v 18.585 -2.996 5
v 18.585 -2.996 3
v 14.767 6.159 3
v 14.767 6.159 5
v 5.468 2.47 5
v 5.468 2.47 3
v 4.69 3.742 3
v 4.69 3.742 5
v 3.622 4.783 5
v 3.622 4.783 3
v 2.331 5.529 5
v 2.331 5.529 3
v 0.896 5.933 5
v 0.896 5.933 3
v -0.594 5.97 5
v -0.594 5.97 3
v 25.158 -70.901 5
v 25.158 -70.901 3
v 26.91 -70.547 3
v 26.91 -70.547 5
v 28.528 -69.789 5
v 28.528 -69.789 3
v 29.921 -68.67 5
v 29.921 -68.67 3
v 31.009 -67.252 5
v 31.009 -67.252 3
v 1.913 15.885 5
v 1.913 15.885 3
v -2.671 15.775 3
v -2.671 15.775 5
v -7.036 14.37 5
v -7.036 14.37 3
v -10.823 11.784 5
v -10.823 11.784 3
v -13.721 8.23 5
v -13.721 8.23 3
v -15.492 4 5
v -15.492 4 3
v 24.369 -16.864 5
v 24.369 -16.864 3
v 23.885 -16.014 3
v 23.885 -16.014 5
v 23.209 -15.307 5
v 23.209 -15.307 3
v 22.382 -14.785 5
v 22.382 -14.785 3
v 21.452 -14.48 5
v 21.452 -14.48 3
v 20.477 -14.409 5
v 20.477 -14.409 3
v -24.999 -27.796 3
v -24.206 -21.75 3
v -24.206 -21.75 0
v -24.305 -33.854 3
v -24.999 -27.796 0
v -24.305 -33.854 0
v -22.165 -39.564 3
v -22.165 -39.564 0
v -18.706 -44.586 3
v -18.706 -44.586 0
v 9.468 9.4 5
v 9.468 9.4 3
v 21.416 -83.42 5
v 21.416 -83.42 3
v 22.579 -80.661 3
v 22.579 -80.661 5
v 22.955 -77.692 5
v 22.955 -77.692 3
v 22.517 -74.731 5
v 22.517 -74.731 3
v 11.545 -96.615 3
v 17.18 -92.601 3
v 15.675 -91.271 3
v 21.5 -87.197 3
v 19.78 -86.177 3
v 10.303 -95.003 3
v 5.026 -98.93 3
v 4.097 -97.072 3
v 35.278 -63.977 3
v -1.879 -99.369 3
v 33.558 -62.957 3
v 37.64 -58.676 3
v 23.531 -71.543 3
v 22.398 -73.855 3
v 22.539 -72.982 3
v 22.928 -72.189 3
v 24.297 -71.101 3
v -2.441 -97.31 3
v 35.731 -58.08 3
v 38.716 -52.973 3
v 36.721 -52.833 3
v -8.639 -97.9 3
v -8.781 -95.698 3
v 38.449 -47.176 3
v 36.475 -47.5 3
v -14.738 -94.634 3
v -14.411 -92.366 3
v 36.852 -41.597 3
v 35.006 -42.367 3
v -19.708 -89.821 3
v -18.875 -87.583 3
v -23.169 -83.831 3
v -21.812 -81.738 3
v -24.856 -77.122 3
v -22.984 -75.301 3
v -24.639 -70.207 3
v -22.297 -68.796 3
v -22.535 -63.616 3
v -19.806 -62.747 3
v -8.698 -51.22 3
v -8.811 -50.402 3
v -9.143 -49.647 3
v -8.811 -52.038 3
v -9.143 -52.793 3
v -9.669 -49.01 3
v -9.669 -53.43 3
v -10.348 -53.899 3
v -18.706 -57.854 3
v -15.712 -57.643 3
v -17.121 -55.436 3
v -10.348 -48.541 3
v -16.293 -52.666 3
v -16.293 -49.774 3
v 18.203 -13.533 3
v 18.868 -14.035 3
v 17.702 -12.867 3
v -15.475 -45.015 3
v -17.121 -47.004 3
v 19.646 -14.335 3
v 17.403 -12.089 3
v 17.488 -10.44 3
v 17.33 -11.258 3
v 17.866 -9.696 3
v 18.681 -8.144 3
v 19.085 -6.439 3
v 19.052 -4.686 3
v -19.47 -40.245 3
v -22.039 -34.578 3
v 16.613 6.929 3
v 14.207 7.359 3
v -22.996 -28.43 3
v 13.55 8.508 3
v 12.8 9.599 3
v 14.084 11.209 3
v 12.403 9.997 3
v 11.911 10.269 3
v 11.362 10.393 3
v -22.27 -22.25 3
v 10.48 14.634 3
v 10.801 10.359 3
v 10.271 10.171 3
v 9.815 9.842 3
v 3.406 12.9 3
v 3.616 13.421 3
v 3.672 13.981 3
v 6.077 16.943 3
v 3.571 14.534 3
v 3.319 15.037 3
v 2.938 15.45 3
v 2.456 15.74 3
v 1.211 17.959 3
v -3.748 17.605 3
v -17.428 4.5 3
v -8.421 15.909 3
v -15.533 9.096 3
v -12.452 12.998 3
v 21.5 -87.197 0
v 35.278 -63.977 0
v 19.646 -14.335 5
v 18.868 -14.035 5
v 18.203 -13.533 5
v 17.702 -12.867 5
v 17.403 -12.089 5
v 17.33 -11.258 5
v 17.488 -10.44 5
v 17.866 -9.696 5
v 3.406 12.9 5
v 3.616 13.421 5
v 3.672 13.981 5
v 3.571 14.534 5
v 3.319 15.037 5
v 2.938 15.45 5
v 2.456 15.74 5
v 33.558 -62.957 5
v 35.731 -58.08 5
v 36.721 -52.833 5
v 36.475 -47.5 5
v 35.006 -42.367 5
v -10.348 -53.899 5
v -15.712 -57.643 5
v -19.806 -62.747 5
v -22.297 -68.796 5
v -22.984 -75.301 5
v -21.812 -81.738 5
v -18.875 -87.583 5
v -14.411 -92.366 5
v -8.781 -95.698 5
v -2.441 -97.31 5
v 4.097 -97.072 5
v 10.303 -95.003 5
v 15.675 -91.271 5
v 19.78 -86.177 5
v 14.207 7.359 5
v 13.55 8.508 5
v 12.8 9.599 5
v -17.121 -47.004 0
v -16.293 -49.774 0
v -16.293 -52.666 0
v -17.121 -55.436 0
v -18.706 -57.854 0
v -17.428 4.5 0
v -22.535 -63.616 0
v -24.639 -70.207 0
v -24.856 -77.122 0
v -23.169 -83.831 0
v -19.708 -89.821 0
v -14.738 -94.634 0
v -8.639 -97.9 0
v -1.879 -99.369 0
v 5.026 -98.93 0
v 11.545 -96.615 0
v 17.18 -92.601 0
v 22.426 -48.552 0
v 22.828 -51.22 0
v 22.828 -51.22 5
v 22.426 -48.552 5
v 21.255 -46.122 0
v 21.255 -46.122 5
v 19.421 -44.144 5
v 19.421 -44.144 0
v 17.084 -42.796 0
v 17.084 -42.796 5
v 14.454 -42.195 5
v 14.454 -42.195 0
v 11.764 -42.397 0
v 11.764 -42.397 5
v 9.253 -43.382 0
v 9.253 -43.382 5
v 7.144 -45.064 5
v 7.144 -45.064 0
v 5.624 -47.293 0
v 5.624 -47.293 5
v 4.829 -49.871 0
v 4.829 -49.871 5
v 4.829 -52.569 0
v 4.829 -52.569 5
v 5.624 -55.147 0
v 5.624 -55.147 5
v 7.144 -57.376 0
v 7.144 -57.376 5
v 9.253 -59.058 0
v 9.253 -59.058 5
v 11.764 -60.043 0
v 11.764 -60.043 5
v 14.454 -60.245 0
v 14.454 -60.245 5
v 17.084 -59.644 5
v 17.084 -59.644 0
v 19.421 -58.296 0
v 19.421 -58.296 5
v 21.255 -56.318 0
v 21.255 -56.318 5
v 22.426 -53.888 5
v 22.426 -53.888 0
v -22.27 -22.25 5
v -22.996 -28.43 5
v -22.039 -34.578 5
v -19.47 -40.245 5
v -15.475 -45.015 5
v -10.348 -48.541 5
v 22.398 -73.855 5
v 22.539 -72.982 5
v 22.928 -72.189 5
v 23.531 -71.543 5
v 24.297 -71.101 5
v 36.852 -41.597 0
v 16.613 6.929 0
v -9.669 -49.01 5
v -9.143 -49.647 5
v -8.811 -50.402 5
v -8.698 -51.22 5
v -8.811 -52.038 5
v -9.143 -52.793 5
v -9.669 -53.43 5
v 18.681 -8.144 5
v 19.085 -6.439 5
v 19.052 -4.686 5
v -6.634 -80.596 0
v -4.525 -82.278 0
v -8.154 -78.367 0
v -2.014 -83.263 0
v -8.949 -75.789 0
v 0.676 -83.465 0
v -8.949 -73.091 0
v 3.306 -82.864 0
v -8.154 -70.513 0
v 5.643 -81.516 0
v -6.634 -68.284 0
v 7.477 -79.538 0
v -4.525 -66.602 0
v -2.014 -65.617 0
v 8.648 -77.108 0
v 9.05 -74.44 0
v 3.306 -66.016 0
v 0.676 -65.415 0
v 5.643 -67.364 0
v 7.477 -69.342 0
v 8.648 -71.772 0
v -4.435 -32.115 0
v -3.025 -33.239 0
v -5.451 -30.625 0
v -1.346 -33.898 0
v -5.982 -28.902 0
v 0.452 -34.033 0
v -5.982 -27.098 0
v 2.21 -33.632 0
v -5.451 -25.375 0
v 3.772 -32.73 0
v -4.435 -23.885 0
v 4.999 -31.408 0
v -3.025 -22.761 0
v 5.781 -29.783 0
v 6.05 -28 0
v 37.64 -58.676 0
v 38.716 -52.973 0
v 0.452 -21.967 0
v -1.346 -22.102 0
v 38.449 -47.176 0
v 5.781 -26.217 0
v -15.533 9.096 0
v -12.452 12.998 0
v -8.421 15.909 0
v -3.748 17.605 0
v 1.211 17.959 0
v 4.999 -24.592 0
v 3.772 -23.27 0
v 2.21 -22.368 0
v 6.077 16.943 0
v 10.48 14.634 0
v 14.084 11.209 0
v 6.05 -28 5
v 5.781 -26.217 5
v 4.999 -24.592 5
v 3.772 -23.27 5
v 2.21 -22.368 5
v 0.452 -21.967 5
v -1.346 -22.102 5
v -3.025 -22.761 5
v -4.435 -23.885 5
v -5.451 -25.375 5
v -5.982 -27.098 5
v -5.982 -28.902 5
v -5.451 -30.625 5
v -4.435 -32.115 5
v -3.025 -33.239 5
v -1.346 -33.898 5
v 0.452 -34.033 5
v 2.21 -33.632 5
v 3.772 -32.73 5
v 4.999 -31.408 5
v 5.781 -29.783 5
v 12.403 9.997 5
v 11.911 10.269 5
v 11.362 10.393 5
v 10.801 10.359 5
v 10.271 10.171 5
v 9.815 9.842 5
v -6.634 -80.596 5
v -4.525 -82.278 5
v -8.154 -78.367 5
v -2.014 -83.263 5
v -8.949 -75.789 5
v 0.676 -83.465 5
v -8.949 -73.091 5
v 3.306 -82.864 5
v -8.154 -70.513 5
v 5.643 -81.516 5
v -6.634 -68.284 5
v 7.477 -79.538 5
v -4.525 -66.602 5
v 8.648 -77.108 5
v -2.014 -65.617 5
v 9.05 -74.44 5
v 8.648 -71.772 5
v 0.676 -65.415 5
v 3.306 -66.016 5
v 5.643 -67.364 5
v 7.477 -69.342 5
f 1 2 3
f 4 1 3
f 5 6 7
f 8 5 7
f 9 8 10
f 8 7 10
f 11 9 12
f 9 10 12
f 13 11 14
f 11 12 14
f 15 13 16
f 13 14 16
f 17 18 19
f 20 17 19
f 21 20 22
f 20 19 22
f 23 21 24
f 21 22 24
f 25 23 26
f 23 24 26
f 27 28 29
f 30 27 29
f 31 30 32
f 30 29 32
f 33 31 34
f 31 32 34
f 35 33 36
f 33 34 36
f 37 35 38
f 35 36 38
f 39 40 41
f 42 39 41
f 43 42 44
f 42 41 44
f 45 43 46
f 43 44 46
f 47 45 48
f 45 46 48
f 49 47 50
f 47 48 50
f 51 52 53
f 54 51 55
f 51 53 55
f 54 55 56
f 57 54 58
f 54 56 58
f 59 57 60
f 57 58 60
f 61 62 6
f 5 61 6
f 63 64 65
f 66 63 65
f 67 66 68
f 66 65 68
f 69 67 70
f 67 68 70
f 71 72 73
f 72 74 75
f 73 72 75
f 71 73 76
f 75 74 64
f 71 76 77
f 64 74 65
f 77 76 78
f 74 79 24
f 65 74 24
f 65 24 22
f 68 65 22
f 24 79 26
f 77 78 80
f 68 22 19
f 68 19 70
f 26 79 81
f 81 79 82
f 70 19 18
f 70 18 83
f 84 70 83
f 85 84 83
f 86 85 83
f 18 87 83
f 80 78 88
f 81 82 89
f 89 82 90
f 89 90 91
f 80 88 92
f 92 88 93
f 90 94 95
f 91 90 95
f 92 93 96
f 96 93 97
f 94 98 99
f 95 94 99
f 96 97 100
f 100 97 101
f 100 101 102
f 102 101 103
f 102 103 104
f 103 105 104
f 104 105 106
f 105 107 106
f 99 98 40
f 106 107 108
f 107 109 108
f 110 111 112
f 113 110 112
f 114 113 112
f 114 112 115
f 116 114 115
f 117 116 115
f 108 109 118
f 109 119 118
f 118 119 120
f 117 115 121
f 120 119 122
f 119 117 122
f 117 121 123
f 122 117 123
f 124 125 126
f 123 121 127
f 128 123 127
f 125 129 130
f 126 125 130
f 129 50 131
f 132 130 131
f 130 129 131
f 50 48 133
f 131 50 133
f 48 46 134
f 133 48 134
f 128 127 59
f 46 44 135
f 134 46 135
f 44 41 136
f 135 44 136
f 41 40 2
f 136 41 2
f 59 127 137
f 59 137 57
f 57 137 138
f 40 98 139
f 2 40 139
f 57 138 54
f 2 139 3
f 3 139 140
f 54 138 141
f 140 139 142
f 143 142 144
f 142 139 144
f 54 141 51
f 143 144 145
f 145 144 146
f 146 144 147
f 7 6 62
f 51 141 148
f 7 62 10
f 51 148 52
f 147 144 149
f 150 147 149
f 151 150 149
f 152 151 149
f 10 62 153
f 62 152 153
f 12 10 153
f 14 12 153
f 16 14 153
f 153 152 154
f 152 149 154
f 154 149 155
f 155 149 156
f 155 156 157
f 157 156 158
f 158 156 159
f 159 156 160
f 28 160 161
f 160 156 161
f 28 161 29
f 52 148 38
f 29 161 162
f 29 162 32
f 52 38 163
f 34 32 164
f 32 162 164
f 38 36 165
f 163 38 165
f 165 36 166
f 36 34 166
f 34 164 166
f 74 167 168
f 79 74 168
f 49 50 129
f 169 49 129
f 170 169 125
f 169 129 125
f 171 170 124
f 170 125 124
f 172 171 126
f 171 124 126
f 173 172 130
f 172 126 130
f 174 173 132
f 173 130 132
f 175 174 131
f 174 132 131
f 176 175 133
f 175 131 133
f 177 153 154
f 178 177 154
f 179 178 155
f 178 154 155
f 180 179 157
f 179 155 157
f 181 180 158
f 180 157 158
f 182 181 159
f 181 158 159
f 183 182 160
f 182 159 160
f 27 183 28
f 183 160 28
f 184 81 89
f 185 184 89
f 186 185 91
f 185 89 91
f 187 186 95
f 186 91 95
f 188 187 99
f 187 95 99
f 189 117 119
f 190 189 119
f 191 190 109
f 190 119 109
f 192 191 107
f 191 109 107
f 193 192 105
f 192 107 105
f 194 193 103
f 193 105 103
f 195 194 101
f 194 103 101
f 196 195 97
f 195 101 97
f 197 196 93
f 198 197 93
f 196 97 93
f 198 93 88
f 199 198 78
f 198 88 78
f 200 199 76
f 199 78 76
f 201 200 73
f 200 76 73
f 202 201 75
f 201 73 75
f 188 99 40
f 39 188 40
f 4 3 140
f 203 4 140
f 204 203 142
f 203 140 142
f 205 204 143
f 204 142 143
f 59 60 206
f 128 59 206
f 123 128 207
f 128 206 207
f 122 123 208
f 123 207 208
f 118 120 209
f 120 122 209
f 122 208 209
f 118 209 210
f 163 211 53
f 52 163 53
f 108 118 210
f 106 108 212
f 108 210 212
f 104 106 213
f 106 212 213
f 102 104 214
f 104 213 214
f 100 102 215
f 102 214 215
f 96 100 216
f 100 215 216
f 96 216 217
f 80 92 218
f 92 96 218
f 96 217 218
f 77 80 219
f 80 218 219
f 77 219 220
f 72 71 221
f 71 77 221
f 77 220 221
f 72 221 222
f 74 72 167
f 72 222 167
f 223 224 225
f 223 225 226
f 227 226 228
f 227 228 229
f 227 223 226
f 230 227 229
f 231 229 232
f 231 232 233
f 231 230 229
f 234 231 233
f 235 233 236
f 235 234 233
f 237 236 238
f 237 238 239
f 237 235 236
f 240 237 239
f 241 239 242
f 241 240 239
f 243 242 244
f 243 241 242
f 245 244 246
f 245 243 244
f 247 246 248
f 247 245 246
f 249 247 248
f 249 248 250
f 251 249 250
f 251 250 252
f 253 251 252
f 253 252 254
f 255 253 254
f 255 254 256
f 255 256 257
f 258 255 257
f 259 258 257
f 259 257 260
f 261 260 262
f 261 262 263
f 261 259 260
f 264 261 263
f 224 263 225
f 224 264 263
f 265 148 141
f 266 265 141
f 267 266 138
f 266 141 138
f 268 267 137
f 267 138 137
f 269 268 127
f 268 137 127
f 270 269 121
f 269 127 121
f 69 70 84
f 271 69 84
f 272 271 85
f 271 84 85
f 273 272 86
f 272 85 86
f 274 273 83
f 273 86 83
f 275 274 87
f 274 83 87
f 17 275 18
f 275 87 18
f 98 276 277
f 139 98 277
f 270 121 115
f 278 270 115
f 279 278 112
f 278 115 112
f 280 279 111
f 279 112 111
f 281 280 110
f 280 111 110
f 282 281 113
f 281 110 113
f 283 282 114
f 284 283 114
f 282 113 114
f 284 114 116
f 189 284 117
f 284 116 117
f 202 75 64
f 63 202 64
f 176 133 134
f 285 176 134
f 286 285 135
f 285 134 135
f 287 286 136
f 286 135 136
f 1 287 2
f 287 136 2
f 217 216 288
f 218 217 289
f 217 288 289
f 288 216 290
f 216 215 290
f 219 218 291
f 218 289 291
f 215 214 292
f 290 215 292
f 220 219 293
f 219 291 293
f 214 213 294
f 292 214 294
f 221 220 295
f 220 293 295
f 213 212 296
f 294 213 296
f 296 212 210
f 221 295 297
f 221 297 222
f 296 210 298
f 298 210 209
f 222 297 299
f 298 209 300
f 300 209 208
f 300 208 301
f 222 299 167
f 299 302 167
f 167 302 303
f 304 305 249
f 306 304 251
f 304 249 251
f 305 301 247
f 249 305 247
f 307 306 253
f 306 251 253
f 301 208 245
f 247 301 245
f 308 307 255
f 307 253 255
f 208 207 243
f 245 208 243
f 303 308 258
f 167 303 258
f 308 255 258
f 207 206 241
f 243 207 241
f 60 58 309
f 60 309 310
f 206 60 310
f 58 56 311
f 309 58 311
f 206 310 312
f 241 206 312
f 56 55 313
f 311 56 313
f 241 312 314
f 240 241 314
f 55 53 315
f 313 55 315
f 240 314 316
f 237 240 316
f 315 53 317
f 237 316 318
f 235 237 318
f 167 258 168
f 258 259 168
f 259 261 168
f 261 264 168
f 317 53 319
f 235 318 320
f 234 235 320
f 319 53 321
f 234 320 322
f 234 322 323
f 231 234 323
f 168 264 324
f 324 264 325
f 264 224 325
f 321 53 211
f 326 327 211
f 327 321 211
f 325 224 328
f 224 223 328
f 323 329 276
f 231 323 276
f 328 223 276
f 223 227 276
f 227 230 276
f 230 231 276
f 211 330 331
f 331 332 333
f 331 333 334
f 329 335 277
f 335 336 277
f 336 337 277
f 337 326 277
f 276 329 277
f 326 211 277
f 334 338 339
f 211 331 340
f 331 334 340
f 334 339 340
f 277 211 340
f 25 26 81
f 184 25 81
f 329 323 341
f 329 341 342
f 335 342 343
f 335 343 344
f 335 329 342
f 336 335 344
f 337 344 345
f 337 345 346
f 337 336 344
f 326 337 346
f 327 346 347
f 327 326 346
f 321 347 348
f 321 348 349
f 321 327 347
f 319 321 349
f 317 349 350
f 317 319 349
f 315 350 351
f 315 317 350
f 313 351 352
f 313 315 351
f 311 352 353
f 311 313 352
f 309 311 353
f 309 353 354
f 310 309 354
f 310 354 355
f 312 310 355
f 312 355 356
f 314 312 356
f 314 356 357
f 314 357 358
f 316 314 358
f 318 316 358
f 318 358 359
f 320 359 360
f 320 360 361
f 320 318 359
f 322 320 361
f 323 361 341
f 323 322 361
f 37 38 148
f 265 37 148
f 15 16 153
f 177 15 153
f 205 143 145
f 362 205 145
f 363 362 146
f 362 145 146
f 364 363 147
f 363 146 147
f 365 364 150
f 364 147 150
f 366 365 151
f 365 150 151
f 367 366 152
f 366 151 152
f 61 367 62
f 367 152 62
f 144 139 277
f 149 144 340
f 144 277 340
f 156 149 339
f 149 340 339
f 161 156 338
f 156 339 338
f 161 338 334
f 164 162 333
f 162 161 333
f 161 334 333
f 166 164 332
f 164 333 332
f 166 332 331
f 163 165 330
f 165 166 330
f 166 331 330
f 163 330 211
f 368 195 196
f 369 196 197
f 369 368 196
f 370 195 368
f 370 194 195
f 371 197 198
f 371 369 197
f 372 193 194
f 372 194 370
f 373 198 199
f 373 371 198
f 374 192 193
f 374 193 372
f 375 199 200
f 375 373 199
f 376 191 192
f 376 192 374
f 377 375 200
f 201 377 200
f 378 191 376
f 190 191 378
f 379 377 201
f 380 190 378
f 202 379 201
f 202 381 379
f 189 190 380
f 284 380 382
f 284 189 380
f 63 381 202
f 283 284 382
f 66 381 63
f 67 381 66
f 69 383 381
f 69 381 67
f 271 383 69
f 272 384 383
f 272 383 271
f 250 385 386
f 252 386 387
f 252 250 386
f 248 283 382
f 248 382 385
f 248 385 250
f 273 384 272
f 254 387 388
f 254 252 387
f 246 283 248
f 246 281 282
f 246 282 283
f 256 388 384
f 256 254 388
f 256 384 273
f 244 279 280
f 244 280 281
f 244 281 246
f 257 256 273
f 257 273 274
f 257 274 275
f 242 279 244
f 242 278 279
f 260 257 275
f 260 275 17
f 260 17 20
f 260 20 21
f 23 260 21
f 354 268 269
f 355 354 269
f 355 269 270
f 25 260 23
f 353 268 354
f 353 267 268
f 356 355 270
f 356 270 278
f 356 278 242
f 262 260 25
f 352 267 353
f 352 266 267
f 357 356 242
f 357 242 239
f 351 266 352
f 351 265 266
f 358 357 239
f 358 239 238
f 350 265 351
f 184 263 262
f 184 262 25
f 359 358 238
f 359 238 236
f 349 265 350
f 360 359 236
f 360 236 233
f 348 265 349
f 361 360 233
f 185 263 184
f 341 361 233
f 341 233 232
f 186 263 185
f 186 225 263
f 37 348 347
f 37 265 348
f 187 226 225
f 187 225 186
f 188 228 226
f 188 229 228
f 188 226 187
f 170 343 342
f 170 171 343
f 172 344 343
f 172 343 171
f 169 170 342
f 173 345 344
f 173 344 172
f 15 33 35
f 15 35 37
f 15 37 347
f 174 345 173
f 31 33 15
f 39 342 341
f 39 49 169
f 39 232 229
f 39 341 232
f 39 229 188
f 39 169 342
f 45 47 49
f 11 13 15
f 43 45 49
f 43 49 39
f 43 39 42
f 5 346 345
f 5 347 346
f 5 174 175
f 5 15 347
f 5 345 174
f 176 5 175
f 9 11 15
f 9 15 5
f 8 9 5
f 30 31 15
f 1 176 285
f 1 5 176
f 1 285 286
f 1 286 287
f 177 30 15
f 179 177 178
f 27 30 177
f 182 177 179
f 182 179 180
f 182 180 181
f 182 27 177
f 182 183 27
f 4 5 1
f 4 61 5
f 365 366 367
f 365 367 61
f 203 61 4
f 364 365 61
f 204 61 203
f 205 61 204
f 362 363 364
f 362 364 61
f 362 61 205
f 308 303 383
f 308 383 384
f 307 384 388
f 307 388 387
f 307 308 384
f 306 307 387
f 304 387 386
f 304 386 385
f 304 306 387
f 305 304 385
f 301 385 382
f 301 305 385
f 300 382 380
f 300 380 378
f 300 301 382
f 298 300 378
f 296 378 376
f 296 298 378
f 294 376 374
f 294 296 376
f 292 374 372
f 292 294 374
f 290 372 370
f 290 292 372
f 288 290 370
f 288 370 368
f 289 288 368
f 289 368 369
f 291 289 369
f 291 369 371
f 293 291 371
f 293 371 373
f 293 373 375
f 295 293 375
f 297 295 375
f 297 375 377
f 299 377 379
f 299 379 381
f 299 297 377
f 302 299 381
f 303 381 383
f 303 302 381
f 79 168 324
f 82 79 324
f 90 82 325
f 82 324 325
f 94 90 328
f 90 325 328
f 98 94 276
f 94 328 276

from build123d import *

# Parameters (mm, degrees)
SKETCH1_R           = 6.05
SKETCH1_R_2         = 9.05
BOSS_EXTRUDE1_DEPTH = 5
CUT_EXTRUDE1_START  = -2
CUT_EXTRUDE1_DEPTH  = 2


with BuildPart() as part:
    # Sketch1 → Boss-Extrude1 (new body)
    with BuildSketch(Plane.XY):
        with BuildLine():
            Line((-17.428425058, 4.5), (-24.206145914, -21.75))
            ThreePointArc((-24.206145914, -21.75), (-24.304944461, -33.854030643), (-18.705990528, -44.585714286))
            ThreePointArc((-18.705990528, -44.585714286), (-16.188386739, -51.22), (-18.705990528, -57.854285714))
            ThreePointArc((-18.705990528, -57.854285714), (-14.737892988, -94.633922608), (21.5, -87.197350822))
            Line((21.5, -87.197350822), (35.277938888, -63.977350822))
            ThreePointArc((35.277938888, -63.977350822), (38.71637128, -52.973450833), (36.851550967, -41.59667284))
            Line((36.851550967, -41.59667284), (16.613000697, 6.928795555))
            ThreePointArc((16.613000697, 6.928795555), (-1.281011782, 17.954359048), (-17.428425058, 4.5))
        make_face()
        with Locations((0, -28)):
            Circle(SKETCH1_R, mode=Mode.SUBTRACT)
        with Locations((13.777938888, -51.22)):
            Circle(SKETCH1_R_2, mode=Mode.SUBTRACT)
        with Locations((0, -74.44)):
            Circle(SKETCH1_R_2, mode=Mode.SUBTRACT)
    extrude(amount=BOSS_EXTRUDE1_DEPTH)

    # Sketch2 → Cut-Extrude1 (cut)
    with BuildSketch(Plane.XY.offset(5).offset(CUT_EXTRUDE1_START)):
        with BuildLine():
            Line((16.613000697, 6.928795555), (36.851550967, -41.59667284))
            ThreePointArc((36.851550967, -41.59667284), (38.71637128, -52.973450833), (35.277938888, -63.977350822))
            Line((35.277938888, -63.977350822), (21.5, -87.197350822))
            ThreePointArc((21.5, -87.197350822), (-14.737892988, -94.633922608), (-18.705990528, -57.854285714))
            ThreePointArc((-18.705990528, -57.854285714), (-16.188386739, -51.22), (-18.705990528, -44.585714286))
            ThreePointArc((-18.705990528, -44.585714286), (-24.304944461, -33.854030643), (-24.206145914, -21.75))
            Line((-24.206145914, -21.75), (-17.428425058, 4.5))
            ThreePointArc((-17.428425058, 4.5), (-1.281011782, 17.954359048), (16.613000697, 6.928795555))
        make_face()
        with BuildLine():
            Line((9.468285508, 9.39955156), (5.467787499, 2.470485754))
            ThreePointArc((5.467787499, 2.470485754), (3, 5.196152423), (-0.594390327, 5.970485754))
            Line((-0.594390327, 5.970485754), (3.406107682, 12.89955156))
            ThreePointArc((3.406107682, 12.89955156), (3.46289335, 14.794014563), (1.913207856, 15.885201783))
            ThreePointArc((1.913207856, 15.885201783), (-9.022746373, 13.213252737), (-15.491933385, 4))
            Line((-15.491933385, 4), (-22.269654241, -22.25))
            ThreePointArc((-22.269654241, -22.25), (-20.946970822, -37.498653241), (-10.347792006, -48.540769231))
            ThreePointArc((-10.347792006, -48.540769231), (-8.697504007, -51.22), (-10.347792006, -53.899230769))
            ThreePointArc((-10.347792006, -53.899230769), (-16.813726675, -90.133903125), (19.78, -86.176762756))
            Line((19.78, -86.176762756), (21.416047429, -83.419527323))
            ThreePointArc((21.416047429, -83.419527323), (22.868749584, -79.189380689), (22.517294907, -74.730573258))
            ThreePointArc((22.517294907, -74.730573258), (22.927957655, -72.188598464), (25.15802624, -70.901324657))
            ThreePointArc((25.15802624, -70.901324657), (28.527716294, -69.789192601), (31.009004018, -67.252490018))
            Line((31.009004018, -67.252490018), (33.557938888, -62.956762756))
            ThreePointArc((33.557938888, -62.956762756), (36.721296689, -52.833174766), (35.005662001, -42.366539013))
            Line((35.005662001, -42.366539013), (24.369440107, -16.864334436))
            ThreePointArc((24.369440107, -16.864334436), (22.811532345, -15.020784633), (20.47666212, -14.409120101))
            ThreePointArc((20.47666212, -14.409120101), (17.701744194, -12.866781789), (17.865596008, -9.696272437))
            ThreePointArc((17.865596008, -9.696272437), (19.084800596, -6.438585473), (18.585469893, -2.996252973))
            Line((18.585469893, -2.996252973), (14.76711173, 6.158929383))
            ThreePointArc((14.76711173, 6.158929383), (13.890682857, 7.940335621), (12.800384361, 9.599487498))
            ThreePointArc((12.800384361, 9.599487498), (11.080545761, 10.395960893), (9.468285508, 9.39955156))
        make_face(mode=Mode.SUBTRACT)
    extrude(amount=CUT_EXTRUDE1_DEPTH, mode=Mode.SUBTRACT)


solid = part.part
